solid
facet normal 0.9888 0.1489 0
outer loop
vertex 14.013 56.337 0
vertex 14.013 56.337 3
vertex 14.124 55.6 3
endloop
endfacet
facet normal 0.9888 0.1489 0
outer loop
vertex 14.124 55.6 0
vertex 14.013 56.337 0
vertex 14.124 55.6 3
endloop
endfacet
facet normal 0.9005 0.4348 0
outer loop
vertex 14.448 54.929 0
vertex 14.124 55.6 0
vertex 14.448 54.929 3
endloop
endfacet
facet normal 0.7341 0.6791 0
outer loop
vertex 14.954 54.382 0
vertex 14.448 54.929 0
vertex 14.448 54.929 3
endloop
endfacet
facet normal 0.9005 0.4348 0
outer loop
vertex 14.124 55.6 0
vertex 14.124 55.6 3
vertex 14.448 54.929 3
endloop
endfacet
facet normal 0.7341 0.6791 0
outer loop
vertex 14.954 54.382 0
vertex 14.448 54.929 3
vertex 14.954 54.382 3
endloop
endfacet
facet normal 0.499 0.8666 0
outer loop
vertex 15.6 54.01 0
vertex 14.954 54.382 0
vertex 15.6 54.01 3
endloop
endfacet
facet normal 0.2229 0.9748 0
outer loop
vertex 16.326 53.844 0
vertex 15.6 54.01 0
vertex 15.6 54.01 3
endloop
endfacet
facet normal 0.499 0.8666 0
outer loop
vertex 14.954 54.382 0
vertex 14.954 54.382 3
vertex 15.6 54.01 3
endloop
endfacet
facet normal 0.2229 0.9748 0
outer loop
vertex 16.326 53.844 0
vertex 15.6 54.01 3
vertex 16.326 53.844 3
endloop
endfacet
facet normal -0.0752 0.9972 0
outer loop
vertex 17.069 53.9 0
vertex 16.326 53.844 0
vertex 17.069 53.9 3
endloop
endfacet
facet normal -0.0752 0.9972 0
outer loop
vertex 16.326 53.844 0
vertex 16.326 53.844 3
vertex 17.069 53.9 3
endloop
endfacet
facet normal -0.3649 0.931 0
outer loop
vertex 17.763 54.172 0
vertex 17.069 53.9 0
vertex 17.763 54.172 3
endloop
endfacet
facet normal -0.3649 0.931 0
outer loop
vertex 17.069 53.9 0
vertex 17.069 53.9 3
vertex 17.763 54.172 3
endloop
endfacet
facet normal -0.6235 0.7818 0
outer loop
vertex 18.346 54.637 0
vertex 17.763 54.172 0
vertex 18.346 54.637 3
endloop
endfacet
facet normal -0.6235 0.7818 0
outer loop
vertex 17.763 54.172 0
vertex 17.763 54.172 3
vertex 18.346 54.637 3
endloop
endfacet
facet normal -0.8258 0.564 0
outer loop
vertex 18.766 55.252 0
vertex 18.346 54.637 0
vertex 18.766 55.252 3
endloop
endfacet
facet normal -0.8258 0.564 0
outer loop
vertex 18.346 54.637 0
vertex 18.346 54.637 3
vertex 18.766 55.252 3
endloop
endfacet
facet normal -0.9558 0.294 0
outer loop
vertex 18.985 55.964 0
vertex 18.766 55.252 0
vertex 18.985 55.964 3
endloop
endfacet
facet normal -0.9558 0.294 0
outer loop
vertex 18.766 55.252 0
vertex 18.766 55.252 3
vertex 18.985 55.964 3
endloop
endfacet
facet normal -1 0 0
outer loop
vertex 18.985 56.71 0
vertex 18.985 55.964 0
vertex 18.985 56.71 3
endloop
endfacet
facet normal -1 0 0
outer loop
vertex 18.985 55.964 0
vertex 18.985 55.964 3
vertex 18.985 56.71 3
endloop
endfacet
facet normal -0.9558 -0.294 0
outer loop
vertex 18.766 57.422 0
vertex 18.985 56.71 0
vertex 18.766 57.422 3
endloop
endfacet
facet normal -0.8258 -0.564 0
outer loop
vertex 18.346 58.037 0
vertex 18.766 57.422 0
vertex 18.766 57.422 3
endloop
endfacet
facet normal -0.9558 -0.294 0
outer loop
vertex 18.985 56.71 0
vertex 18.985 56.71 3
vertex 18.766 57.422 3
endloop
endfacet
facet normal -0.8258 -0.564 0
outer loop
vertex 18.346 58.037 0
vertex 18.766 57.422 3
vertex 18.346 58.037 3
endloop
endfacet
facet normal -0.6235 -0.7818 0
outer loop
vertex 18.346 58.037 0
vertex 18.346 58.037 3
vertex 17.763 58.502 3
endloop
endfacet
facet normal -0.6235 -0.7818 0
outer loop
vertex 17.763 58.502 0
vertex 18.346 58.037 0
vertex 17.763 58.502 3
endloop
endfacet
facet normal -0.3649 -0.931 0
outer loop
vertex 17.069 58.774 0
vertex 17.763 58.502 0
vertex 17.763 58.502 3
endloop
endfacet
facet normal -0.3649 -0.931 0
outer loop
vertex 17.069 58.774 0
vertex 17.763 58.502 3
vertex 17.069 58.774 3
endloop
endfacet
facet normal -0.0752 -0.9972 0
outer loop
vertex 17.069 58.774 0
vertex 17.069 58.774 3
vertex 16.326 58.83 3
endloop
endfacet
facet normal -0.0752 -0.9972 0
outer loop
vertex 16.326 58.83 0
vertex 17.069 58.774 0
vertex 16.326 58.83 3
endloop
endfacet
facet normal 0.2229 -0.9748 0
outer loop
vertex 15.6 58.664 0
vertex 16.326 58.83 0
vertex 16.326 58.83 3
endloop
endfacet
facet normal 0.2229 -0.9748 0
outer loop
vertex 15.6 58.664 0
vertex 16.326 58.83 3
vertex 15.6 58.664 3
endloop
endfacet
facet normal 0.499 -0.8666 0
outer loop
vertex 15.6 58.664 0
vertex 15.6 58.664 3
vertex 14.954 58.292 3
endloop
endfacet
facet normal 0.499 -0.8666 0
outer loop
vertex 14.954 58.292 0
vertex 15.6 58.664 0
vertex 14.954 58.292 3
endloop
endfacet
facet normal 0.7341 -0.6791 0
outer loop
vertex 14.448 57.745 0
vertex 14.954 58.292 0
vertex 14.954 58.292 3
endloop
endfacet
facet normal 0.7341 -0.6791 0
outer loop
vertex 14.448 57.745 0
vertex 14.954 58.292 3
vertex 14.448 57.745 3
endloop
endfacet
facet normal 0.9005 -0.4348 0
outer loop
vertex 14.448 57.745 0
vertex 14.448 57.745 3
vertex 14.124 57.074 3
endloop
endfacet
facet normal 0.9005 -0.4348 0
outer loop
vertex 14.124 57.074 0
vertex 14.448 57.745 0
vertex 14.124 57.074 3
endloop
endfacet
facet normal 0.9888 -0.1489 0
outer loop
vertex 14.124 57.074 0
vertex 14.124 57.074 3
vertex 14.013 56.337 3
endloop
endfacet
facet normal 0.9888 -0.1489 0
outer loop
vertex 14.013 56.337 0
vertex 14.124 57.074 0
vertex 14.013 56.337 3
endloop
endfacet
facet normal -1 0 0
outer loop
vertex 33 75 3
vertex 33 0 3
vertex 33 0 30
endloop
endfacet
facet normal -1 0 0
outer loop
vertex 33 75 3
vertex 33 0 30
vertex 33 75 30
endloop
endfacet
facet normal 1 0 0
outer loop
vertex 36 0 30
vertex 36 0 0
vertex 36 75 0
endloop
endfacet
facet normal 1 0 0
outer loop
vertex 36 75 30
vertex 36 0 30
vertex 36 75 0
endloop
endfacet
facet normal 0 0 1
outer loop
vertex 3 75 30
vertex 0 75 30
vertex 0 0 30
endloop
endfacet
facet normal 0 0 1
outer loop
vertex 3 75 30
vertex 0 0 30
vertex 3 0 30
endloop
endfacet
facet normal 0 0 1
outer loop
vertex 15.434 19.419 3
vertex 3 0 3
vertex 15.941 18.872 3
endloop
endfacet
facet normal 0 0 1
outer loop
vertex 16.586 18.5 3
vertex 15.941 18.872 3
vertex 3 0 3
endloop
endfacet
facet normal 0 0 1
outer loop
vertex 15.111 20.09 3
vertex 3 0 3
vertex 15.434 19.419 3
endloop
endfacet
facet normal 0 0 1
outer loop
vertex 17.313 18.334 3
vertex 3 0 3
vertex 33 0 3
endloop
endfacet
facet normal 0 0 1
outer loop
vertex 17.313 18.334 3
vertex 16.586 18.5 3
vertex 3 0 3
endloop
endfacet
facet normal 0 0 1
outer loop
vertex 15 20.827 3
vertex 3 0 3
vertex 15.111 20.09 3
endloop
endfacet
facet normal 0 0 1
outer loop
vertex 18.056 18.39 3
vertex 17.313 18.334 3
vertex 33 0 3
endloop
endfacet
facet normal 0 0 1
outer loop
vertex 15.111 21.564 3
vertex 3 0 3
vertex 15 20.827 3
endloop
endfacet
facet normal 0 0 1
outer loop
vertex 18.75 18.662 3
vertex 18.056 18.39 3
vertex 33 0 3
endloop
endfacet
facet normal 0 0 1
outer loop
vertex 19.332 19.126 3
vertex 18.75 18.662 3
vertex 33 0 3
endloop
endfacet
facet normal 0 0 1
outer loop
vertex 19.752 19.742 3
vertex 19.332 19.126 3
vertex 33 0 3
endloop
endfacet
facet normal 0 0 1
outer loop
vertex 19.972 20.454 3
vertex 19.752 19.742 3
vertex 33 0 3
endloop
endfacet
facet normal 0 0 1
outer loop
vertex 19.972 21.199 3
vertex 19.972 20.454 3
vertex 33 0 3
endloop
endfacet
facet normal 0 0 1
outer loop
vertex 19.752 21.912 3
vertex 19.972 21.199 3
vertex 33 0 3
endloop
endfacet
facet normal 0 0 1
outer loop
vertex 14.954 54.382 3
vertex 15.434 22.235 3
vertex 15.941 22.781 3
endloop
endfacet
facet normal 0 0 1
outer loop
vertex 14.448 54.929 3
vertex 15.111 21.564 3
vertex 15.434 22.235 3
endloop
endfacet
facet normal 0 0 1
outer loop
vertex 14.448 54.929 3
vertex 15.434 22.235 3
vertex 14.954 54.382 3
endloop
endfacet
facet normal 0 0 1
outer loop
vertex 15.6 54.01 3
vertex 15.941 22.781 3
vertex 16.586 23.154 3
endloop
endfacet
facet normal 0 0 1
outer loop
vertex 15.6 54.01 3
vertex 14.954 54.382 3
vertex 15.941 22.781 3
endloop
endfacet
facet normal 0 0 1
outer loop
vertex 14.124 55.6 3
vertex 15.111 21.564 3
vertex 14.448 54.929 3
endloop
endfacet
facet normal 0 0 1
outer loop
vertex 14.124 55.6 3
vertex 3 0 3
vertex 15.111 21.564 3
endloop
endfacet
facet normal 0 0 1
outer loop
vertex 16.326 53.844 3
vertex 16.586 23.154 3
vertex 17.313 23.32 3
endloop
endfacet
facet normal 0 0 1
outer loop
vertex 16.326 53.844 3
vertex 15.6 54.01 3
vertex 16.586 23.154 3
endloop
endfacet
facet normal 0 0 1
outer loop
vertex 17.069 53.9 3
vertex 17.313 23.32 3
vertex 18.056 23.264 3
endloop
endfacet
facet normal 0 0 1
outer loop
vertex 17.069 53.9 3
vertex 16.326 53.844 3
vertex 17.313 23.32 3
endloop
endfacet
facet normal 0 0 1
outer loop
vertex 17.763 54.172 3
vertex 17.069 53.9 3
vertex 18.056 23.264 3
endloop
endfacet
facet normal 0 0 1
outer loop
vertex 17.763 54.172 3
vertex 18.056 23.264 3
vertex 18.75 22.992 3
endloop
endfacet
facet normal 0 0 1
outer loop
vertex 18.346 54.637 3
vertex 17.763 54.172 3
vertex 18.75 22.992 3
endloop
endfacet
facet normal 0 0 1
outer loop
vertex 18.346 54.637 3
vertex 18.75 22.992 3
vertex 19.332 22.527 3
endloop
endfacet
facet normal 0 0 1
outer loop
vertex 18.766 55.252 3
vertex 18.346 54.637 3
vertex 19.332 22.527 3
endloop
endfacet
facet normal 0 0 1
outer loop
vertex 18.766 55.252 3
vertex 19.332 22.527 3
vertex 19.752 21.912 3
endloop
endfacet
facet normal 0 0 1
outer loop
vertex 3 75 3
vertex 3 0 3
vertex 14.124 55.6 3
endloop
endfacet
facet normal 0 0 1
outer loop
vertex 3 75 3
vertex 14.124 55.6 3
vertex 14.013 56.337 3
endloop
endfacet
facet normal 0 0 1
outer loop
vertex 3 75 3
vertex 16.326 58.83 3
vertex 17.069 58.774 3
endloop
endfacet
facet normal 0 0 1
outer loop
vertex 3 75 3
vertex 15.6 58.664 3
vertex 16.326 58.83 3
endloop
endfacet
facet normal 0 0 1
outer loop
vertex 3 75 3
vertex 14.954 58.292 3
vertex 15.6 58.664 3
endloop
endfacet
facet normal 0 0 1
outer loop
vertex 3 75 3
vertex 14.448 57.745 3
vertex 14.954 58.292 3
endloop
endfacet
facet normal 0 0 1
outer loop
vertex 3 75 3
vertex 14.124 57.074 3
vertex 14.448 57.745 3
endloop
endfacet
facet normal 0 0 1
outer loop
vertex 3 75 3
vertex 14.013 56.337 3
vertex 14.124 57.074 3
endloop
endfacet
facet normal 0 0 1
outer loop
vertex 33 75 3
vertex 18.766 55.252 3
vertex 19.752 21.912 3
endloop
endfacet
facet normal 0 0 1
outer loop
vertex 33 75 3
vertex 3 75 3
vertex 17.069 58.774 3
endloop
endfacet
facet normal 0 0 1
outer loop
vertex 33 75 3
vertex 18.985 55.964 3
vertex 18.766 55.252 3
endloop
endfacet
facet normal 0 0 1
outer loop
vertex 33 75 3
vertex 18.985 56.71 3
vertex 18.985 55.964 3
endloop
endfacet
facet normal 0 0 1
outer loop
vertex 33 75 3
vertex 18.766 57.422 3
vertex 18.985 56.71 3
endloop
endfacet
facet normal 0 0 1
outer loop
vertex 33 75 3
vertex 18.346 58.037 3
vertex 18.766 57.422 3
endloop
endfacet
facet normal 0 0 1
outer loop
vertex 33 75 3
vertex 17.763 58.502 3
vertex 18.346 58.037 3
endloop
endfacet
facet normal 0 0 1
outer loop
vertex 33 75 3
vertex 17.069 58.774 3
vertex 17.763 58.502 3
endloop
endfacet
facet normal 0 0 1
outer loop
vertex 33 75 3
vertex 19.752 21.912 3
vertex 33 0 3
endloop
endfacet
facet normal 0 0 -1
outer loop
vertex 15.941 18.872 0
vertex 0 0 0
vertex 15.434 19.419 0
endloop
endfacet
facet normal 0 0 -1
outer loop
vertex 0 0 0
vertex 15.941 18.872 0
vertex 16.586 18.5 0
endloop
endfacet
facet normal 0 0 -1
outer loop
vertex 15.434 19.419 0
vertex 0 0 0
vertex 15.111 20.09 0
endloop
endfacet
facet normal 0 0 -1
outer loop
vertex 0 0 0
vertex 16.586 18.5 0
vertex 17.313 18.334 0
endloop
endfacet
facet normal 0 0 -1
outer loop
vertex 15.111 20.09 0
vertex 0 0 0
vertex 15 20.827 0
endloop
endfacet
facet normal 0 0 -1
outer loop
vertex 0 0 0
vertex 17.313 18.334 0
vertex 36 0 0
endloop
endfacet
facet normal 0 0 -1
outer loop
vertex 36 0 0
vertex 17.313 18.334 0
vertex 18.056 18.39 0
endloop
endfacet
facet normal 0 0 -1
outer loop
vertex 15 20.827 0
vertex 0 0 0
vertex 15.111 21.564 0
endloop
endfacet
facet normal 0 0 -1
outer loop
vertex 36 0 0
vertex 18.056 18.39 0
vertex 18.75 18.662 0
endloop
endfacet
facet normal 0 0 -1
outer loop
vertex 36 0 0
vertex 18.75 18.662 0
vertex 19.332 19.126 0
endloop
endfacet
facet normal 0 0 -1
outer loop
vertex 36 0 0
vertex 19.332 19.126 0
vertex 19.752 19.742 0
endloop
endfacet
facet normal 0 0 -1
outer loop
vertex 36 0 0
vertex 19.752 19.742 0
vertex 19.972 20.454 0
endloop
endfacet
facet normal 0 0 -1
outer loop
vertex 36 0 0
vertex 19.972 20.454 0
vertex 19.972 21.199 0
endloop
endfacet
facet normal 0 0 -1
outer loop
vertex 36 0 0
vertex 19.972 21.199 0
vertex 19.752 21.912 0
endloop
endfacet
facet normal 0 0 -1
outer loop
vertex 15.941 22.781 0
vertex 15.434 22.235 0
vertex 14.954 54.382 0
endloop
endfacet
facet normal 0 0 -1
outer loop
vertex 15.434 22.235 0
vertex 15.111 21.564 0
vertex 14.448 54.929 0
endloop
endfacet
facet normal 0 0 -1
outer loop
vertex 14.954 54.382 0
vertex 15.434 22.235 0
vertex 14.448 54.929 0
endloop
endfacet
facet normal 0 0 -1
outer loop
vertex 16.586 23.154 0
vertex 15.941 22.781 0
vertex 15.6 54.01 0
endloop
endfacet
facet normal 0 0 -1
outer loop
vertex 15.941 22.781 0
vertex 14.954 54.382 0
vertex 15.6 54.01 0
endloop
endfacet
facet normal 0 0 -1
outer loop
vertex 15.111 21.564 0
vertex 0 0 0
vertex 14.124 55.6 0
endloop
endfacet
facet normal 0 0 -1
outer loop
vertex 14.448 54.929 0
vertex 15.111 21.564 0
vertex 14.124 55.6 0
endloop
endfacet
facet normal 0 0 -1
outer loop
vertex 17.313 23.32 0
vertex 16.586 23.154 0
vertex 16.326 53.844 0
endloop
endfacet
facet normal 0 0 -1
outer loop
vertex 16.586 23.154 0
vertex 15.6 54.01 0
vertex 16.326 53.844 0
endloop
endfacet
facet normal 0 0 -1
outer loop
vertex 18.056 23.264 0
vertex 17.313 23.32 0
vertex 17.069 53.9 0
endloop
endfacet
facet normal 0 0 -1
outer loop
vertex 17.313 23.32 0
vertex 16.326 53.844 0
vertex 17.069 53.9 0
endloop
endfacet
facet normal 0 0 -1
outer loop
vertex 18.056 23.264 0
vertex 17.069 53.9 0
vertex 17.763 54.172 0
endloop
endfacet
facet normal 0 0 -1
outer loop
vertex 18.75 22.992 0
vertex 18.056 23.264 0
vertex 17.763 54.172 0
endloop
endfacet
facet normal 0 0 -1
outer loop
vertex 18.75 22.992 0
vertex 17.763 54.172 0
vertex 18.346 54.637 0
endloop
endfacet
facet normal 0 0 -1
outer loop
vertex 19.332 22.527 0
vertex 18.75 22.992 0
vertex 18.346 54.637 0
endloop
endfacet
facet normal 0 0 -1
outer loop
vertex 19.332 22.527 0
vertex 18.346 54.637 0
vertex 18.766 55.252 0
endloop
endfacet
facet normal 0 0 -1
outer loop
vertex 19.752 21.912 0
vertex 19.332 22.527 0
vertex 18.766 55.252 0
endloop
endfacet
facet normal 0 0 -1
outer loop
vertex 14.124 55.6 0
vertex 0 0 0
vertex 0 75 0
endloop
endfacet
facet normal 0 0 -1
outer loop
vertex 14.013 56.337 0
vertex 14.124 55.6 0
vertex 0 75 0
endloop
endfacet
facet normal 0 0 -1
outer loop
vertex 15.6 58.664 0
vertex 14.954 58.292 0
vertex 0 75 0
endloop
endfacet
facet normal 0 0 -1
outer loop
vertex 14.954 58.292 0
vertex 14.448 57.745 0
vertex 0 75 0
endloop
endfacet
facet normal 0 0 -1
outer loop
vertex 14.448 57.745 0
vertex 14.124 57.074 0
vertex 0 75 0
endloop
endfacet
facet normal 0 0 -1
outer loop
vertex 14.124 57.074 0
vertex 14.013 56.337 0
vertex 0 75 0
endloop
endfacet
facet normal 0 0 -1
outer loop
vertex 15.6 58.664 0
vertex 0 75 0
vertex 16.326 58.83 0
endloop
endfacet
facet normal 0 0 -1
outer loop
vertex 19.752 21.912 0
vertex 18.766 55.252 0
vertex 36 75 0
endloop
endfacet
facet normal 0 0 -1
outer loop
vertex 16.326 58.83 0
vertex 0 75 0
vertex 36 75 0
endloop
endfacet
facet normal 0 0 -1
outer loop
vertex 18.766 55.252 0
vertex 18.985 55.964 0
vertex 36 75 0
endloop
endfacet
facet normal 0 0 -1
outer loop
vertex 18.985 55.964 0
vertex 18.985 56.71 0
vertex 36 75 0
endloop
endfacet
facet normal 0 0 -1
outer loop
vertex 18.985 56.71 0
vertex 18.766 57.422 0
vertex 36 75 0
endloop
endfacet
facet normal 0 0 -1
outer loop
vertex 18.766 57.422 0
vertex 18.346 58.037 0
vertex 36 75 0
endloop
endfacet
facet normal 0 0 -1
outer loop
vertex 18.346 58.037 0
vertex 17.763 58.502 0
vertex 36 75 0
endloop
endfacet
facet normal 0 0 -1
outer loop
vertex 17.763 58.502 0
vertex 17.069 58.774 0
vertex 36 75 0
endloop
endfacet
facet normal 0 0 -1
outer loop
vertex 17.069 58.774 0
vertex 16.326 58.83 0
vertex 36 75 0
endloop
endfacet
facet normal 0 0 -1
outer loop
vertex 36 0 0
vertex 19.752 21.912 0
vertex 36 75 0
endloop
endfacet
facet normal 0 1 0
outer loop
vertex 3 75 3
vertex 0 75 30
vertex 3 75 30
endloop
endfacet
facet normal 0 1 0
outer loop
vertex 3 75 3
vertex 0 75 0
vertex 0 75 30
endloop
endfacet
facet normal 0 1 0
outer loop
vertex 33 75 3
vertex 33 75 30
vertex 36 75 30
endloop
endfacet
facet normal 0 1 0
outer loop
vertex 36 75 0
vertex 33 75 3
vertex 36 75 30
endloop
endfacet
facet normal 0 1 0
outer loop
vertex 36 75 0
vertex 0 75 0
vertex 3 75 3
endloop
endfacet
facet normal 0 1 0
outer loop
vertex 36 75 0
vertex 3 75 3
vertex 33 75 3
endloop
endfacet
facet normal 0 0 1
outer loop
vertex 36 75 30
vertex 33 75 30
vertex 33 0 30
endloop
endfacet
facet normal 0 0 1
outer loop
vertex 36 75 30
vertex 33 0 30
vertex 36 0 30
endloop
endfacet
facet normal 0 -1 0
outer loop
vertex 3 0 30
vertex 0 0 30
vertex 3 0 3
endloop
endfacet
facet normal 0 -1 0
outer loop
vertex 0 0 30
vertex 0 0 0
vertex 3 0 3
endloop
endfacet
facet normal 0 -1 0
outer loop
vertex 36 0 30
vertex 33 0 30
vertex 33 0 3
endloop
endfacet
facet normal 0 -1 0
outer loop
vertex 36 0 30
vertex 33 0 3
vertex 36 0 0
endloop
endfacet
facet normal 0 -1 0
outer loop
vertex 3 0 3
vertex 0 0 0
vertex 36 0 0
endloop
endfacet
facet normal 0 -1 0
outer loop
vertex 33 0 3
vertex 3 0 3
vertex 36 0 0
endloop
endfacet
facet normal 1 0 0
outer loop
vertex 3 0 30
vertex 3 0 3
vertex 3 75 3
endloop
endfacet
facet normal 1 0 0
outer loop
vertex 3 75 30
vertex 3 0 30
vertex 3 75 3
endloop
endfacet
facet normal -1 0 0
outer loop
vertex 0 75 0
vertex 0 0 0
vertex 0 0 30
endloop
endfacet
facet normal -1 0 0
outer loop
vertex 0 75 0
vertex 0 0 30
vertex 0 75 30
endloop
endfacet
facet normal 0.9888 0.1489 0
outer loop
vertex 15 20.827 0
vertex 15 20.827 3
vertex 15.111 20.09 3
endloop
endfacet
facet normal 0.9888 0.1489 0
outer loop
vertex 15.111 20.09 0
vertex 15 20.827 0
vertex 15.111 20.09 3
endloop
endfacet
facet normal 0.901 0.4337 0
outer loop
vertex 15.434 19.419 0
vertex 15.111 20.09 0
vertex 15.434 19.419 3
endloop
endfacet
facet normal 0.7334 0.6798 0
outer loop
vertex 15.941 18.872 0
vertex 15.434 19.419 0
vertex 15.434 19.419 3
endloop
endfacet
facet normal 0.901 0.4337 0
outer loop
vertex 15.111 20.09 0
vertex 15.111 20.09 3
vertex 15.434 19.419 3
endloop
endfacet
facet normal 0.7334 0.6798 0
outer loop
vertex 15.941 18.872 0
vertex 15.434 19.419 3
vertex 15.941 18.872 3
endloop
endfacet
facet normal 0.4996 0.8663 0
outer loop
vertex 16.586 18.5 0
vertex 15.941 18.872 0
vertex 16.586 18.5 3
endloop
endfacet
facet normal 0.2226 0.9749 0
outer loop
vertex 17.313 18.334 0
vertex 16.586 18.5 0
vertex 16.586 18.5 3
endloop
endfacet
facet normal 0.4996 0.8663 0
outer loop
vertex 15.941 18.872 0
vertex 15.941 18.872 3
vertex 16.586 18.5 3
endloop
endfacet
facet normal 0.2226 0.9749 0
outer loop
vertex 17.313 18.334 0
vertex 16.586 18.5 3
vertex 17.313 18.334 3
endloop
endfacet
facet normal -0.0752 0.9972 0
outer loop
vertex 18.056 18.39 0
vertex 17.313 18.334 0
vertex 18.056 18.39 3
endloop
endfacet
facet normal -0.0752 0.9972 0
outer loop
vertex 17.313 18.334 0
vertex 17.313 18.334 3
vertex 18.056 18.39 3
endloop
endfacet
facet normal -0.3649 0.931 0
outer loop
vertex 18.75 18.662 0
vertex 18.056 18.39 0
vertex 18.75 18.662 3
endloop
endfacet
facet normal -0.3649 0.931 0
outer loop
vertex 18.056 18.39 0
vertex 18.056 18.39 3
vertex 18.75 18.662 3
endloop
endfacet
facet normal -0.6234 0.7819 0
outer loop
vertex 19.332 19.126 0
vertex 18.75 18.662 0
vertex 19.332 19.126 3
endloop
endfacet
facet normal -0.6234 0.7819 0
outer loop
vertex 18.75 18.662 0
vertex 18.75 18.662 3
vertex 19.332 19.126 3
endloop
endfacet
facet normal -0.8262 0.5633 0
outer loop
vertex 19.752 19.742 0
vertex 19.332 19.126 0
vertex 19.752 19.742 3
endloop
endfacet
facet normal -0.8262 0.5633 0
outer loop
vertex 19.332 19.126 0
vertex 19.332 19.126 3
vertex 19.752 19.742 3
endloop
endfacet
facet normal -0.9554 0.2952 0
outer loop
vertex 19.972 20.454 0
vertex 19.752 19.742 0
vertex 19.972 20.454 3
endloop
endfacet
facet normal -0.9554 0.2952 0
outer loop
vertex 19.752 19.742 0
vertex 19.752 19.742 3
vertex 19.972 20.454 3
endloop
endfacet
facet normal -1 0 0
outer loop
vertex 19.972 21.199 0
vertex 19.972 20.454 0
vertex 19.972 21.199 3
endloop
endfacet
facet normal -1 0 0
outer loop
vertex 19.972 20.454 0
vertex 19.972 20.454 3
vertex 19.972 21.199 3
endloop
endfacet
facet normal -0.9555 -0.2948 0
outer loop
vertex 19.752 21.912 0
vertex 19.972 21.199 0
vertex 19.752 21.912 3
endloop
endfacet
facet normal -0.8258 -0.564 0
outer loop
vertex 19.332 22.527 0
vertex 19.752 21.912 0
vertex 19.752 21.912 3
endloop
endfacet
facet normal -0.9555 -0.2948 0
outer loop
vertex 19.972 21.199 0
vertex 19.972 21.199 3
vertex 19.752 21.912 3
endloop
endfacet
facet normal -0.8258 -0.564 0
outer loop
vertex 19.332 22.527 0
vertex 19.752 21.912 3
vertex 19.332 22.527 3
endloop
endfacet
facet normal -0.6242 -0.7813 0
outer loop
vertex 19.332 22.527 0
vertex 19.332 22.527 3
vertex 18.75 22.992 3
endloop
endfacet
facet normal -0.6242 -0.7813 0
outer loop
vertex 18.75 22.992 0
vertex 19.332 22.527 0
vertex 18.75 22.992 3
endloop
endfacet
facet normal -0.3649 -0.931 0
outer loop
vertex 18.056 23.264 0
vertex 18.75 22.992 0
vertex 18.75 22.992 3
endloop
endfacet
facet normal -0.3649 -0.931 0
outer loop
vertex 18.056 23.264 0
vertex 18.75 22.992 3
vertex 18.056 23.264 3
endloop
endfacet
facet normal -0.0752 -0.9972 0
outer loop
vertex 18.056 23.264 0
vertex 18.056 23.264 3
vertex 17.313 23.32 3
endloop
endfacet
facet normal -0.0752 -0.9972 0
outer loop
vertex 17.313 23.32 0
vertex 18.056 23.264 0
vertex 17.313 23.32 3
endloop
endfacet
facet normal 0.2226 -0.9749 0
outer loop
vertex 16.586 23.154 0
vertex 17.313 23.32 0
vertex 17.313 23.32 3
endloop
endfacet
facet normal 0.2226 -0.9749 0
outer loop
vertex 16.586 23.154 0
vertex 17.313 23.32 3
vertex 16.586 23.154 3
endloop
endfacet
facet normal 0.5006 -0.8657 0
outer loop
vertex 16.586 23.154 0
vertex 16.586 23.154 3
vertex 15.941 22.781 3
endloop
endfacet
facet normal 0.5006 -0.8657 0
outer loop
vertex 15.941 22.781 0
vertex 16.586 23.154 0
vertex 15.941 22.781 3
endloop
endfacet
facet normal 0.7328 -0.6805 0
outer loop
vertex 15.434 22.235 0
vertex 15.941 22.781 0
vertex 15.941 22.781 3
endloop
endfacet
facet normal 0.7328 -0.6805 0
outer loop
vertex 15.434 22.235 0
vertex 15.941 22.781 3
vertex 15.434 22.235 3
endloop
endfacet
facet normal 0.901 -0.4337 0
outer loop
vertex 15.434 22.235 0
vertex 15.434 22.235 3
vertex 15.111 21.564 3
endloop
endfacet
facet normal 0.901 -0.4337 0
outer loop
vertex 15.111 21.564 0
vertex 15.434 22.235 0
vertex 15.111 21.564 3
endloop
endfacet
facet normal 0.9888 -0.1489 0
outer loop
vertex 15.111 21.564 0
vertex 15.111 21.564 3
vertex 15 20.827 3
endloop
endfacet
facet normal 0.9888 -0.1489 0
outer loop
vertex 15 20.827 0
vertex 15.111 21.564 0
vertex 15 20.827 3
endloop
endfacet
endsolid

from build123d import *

# Parameters (mm, degrees)
F0_W     = 36
F0_H     = 75
F1_DEPTH = 30
F2_T     = -3
F4_D     = 5


with BuildPart() as f1:
    # F0 (on Top) → F1 (new body)
    with BuildSketch(Plane.XY):
        with Locations((18, 37.5)):
            Rectangle(F0_W, F0_H)
    extrude(amount=F1_DEPTH)

    # F2
    f2_openings = [f1.faces().sort_by_distance(p)[0] for p in [
        (18, 0, 15),
        (18, 37.5, 30),
        (18, 75, 15),
    ]]
    offset(amount=F2_T, openings=f2_openings)

    # F4 (through all)
    with Locations(Plane(origin=(0, 0, 0), x_dir=(1, 0, 0), z_dir=(0, 0, -1))):
        with Locations((17.4995128149, -20.8268326492), (16.5131200809, -56.3370103376)):
            Hole(F4_D / 2)


solid = f1.part
